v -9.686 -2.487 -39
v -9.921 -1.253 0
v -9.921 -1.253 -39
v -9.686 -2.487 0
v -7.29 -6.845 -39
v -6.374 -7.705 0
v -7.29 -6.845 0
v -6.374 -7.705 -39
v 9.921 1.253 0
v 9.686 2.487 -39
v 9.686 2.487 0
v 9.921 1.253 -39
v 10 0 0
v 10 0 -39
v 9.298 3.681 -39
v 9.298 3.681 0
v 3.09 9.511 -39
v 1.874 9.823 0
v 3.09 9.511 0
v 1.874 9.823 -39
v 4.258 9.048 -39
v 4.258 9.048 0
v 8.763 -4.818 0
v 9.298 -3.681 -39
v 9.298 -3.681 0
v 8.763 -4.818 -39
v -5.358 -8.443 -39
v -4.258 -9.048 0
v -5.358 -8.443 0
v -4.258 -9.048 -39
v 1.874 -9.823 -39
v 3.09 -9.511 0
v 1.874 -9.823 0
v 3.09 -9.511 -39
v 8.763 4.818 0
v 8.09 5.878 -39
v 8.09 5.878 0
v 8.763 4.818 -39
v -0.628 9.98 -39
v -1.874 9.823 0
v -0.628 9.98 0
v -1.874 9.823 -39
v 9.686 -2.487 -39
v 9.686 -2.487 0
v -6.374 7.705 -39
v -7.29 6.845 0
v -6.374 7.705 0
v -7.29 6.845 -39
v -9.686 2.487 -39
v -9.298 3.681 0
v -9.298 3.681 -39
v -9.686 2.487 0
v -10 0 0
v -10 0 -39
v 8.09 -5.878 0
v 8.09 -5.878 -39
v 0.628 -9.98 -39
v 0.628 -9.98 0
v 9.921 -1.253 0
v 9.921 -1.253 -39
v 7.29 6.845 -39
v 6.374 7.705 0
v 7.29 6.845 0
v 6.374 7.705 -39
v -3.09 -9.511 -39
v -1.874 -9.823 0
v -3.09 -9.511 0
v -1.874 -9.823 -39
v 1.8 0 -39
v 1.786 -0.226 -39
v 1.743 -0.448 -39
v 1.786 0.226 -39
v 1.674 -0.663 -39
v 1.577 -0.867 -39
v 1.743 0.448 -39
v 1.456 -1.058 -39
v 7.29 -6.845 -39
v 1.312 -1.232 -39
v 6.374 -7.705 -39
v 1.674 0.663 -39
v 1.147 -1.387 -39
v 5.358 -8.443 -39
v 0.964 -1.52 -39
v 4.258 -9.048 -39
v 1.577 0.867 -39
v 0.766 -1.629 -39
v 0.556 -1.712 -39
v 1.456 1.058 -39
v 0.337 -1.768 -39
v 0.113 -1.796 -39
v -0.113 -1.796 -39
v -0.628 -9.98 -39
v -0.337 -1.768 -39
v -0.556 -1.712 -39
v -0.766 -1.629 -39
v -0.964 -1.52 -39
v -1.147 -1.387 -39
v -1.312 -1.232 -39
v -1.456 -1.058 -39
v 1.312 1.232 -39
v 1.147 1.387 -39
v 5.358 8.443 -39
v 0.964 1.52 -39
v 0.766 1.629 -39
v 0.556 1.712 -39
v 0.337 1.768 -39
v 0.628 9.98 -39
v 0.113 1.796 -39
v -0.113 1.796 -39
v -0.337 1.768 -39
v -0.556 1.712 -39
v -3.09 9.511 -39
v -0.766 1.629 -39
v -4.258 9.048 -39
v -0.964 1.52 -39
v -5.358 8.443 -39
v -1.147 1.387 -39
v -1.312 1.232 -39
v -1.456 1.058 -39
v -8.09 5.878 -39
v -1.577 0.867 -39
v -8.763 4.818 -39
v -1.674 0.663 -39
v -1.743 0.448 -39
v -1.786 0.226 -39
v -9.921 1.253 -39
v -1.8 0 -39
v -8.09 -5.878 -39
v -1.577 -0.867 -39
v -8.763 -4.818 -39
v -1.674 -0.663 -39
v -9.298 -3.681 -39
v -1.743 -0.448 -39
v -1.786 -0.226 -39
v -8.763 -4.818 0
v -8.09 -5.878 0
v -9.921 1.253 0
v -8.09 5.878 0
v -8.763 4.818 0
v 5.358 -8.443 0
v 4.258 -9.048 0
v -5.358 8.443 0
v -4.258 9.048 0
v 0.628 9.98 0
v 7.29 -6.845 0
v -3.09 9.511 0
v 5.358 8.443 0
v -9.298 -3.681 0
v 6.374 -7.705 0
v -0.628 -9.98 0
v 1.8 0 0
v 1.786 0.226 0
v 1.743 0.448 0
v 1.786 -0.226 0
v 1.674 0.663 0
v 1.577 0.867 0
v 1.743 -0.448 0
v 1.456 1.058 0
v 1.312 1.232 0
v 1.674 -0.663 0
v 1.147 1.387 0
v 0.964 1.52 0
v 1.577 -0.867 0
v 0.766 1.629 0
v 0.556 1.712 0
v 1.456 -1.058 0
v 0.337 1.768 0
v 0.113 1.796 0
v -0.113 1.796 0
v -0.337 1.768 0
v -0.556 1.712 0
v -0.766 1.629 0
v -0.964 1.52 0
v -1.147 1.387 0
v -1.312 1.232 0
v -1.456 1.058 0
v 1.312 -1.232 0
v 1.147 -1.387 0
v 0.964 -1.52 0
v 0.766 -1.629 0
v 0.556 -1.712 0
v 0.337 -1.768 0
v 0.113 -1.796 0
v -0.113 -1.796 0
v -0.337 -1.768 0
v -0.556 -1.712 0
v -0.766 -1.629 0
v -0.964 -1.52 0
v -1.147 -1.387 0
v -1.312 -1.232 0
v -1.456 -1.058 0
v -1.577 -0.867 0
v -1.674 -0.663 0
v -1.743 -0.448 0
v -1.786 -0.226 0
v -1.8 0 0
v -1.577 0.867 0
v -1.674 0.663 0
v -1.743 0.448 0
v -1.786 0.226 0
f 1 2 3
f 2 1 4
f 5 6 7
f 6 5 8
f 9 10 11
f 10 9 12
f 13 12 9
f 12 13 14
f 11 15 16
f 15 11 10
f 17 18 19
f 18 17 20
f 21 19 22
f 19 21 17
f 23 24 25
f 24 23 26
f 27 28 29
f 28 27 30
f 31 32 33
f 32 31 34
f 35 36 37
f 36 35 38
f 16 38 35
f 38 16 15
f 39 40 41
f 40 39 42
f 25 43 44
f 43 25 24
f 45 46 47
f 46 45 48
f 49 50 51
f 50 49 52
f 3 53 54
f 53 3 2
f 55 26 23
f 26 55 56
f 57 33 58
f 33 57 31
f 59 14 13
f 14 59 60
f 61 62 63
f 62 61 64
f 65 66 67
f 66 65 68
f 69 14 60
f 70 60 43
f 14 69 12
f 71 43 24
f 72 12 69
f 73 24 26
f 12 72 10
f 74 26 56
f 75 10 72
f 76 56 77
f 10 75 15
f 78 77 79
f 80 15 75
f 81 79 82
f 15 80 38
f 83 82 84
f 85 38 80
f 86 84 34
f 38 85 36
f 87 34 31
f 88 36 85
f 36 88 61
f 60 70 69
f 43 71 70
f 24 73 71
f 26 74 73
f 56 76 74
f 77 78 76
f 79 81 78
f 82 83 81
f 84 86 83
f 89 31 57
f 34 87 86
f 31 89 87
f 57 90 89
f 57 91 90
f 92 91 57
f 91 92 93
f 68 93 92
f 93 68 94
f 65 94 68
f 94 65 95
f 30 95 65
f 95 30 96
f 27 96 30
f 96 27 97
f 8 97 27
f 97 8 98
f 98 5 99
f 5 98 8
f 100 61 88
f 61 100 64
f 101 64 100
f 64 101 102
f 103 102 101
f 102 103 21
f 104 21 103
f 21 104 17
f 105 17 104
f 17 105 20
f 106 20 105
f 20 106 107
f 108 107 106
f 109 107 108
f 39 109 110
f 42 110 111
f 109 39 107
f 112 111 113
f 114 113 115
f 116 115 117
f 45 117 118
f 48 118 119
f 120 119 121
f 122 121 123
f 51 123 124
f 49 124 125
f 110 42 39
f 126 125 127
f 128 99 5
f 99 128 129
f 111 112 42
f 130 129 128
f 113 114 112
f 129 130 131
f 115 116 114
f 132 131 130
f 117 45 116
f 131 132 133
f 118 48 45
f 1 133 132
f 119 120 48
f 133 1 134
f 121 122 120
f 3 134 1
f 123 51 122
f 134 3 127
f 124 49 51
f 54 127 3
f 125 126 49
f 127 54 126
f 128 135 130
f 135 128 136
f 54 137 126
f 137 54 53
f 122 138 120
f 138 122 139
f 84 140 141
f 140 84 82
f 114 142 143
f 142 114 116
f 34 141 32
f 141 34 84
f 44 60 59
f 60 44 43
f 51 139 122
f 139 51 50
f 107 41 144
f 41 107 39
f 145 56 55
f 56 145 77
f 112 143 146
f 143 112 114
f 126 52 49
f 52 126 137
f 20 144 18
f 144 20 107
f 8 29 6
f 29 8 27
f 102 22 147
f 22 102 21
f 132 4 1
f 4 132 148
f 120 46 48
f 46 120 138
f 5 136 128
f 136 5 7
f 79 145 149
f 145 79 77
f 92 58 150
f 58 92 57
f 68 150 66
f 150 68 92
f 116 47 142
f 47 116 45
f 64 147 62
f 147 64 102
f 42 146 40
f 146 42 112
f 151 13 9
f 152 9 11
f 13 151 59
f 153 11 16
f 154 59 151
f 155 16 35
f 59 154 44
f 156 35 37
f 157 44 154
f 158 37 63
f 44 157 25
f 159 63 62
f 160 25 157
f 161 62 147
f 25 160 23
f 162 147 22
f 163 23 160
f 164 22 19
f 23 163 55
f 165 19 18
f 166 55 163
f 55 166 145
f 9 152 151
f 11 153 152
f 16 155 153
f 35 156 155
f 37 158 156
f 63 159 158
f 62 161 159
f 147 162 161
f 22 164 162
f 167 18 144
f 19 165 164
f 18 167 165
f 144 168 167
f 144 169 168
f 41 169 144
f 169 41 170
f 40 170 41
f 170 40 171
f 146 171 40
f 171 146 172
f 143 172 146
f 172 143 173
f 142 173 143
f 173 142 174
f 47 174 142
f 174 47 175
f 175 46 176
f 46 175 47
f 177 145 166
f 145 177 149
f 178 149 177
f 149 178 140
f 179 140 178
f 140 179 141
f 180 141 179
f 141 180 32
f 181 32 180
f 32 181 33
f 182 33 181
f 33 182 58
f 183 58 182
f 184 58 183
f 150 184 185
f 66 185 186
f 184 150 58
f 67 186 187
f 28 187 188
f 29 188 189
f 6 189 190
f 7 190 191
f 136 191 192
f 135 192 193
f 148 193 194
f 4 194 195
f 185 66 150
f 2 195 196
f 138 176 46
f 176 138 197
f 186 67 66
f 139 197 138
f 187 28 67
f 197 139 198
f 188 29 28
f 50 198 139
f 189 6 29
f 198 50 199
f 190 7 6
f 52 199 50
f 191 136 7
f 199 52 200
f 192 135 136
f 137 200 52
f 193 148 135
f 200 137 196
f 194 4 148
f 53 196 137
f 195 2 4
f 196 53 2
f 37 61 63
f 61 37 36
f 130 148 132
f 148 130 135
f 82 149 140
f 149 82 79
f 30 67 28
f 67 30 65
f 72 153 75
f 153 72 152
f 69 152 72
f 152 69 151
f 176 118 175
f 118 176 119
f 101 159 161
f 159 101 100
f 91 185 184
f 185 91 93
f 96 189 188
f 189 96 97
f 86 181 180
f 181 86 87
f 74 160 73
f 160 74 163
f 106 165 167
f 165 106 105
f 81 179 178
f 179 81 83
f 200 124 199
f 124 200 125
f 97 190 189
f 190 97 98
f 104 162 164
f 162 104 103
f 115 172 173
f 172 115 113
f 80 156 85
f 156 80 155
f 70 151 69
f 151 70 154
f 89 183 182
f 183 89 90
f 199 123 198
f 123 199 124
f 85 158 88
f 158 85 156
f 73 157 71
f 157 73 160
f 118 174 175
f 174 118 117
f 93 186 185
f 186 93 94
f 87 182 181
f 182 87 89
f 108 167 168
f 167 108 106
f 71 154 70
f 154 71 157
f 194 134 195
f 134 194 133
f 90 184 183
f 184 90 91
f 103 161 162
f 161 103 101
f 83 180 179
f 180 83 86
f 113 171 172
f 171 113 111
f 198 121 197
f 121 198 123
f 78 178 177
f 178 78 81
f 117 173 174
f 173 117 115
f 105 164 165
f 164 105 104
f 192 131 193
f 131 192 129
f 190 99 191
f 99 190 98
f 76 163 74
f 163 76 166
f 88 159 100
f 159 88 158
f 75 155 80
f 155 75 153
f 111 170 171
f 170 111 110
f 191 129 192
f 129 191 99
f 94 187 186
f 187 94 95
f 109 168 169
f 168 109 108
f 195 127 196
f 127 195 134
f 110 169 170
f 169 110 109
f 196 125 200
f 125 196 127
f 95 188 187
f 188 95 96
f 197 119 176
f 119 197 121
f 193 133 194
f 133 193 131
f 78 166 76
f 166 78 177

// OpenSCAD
$fn = 50;


difference() {
	union() {
		translate(v = [0, 0, -39.0000000000]) {
			cylinder(h = 39, r = 10.0000000000);
		}
		cylinder(h = 0, r = 13.0000000000);
	}
	union() {
		#translate(v = [0, 0, -39]) {
			cylinder(h = 39, r = 1.8000000000);
		}
	}
}
